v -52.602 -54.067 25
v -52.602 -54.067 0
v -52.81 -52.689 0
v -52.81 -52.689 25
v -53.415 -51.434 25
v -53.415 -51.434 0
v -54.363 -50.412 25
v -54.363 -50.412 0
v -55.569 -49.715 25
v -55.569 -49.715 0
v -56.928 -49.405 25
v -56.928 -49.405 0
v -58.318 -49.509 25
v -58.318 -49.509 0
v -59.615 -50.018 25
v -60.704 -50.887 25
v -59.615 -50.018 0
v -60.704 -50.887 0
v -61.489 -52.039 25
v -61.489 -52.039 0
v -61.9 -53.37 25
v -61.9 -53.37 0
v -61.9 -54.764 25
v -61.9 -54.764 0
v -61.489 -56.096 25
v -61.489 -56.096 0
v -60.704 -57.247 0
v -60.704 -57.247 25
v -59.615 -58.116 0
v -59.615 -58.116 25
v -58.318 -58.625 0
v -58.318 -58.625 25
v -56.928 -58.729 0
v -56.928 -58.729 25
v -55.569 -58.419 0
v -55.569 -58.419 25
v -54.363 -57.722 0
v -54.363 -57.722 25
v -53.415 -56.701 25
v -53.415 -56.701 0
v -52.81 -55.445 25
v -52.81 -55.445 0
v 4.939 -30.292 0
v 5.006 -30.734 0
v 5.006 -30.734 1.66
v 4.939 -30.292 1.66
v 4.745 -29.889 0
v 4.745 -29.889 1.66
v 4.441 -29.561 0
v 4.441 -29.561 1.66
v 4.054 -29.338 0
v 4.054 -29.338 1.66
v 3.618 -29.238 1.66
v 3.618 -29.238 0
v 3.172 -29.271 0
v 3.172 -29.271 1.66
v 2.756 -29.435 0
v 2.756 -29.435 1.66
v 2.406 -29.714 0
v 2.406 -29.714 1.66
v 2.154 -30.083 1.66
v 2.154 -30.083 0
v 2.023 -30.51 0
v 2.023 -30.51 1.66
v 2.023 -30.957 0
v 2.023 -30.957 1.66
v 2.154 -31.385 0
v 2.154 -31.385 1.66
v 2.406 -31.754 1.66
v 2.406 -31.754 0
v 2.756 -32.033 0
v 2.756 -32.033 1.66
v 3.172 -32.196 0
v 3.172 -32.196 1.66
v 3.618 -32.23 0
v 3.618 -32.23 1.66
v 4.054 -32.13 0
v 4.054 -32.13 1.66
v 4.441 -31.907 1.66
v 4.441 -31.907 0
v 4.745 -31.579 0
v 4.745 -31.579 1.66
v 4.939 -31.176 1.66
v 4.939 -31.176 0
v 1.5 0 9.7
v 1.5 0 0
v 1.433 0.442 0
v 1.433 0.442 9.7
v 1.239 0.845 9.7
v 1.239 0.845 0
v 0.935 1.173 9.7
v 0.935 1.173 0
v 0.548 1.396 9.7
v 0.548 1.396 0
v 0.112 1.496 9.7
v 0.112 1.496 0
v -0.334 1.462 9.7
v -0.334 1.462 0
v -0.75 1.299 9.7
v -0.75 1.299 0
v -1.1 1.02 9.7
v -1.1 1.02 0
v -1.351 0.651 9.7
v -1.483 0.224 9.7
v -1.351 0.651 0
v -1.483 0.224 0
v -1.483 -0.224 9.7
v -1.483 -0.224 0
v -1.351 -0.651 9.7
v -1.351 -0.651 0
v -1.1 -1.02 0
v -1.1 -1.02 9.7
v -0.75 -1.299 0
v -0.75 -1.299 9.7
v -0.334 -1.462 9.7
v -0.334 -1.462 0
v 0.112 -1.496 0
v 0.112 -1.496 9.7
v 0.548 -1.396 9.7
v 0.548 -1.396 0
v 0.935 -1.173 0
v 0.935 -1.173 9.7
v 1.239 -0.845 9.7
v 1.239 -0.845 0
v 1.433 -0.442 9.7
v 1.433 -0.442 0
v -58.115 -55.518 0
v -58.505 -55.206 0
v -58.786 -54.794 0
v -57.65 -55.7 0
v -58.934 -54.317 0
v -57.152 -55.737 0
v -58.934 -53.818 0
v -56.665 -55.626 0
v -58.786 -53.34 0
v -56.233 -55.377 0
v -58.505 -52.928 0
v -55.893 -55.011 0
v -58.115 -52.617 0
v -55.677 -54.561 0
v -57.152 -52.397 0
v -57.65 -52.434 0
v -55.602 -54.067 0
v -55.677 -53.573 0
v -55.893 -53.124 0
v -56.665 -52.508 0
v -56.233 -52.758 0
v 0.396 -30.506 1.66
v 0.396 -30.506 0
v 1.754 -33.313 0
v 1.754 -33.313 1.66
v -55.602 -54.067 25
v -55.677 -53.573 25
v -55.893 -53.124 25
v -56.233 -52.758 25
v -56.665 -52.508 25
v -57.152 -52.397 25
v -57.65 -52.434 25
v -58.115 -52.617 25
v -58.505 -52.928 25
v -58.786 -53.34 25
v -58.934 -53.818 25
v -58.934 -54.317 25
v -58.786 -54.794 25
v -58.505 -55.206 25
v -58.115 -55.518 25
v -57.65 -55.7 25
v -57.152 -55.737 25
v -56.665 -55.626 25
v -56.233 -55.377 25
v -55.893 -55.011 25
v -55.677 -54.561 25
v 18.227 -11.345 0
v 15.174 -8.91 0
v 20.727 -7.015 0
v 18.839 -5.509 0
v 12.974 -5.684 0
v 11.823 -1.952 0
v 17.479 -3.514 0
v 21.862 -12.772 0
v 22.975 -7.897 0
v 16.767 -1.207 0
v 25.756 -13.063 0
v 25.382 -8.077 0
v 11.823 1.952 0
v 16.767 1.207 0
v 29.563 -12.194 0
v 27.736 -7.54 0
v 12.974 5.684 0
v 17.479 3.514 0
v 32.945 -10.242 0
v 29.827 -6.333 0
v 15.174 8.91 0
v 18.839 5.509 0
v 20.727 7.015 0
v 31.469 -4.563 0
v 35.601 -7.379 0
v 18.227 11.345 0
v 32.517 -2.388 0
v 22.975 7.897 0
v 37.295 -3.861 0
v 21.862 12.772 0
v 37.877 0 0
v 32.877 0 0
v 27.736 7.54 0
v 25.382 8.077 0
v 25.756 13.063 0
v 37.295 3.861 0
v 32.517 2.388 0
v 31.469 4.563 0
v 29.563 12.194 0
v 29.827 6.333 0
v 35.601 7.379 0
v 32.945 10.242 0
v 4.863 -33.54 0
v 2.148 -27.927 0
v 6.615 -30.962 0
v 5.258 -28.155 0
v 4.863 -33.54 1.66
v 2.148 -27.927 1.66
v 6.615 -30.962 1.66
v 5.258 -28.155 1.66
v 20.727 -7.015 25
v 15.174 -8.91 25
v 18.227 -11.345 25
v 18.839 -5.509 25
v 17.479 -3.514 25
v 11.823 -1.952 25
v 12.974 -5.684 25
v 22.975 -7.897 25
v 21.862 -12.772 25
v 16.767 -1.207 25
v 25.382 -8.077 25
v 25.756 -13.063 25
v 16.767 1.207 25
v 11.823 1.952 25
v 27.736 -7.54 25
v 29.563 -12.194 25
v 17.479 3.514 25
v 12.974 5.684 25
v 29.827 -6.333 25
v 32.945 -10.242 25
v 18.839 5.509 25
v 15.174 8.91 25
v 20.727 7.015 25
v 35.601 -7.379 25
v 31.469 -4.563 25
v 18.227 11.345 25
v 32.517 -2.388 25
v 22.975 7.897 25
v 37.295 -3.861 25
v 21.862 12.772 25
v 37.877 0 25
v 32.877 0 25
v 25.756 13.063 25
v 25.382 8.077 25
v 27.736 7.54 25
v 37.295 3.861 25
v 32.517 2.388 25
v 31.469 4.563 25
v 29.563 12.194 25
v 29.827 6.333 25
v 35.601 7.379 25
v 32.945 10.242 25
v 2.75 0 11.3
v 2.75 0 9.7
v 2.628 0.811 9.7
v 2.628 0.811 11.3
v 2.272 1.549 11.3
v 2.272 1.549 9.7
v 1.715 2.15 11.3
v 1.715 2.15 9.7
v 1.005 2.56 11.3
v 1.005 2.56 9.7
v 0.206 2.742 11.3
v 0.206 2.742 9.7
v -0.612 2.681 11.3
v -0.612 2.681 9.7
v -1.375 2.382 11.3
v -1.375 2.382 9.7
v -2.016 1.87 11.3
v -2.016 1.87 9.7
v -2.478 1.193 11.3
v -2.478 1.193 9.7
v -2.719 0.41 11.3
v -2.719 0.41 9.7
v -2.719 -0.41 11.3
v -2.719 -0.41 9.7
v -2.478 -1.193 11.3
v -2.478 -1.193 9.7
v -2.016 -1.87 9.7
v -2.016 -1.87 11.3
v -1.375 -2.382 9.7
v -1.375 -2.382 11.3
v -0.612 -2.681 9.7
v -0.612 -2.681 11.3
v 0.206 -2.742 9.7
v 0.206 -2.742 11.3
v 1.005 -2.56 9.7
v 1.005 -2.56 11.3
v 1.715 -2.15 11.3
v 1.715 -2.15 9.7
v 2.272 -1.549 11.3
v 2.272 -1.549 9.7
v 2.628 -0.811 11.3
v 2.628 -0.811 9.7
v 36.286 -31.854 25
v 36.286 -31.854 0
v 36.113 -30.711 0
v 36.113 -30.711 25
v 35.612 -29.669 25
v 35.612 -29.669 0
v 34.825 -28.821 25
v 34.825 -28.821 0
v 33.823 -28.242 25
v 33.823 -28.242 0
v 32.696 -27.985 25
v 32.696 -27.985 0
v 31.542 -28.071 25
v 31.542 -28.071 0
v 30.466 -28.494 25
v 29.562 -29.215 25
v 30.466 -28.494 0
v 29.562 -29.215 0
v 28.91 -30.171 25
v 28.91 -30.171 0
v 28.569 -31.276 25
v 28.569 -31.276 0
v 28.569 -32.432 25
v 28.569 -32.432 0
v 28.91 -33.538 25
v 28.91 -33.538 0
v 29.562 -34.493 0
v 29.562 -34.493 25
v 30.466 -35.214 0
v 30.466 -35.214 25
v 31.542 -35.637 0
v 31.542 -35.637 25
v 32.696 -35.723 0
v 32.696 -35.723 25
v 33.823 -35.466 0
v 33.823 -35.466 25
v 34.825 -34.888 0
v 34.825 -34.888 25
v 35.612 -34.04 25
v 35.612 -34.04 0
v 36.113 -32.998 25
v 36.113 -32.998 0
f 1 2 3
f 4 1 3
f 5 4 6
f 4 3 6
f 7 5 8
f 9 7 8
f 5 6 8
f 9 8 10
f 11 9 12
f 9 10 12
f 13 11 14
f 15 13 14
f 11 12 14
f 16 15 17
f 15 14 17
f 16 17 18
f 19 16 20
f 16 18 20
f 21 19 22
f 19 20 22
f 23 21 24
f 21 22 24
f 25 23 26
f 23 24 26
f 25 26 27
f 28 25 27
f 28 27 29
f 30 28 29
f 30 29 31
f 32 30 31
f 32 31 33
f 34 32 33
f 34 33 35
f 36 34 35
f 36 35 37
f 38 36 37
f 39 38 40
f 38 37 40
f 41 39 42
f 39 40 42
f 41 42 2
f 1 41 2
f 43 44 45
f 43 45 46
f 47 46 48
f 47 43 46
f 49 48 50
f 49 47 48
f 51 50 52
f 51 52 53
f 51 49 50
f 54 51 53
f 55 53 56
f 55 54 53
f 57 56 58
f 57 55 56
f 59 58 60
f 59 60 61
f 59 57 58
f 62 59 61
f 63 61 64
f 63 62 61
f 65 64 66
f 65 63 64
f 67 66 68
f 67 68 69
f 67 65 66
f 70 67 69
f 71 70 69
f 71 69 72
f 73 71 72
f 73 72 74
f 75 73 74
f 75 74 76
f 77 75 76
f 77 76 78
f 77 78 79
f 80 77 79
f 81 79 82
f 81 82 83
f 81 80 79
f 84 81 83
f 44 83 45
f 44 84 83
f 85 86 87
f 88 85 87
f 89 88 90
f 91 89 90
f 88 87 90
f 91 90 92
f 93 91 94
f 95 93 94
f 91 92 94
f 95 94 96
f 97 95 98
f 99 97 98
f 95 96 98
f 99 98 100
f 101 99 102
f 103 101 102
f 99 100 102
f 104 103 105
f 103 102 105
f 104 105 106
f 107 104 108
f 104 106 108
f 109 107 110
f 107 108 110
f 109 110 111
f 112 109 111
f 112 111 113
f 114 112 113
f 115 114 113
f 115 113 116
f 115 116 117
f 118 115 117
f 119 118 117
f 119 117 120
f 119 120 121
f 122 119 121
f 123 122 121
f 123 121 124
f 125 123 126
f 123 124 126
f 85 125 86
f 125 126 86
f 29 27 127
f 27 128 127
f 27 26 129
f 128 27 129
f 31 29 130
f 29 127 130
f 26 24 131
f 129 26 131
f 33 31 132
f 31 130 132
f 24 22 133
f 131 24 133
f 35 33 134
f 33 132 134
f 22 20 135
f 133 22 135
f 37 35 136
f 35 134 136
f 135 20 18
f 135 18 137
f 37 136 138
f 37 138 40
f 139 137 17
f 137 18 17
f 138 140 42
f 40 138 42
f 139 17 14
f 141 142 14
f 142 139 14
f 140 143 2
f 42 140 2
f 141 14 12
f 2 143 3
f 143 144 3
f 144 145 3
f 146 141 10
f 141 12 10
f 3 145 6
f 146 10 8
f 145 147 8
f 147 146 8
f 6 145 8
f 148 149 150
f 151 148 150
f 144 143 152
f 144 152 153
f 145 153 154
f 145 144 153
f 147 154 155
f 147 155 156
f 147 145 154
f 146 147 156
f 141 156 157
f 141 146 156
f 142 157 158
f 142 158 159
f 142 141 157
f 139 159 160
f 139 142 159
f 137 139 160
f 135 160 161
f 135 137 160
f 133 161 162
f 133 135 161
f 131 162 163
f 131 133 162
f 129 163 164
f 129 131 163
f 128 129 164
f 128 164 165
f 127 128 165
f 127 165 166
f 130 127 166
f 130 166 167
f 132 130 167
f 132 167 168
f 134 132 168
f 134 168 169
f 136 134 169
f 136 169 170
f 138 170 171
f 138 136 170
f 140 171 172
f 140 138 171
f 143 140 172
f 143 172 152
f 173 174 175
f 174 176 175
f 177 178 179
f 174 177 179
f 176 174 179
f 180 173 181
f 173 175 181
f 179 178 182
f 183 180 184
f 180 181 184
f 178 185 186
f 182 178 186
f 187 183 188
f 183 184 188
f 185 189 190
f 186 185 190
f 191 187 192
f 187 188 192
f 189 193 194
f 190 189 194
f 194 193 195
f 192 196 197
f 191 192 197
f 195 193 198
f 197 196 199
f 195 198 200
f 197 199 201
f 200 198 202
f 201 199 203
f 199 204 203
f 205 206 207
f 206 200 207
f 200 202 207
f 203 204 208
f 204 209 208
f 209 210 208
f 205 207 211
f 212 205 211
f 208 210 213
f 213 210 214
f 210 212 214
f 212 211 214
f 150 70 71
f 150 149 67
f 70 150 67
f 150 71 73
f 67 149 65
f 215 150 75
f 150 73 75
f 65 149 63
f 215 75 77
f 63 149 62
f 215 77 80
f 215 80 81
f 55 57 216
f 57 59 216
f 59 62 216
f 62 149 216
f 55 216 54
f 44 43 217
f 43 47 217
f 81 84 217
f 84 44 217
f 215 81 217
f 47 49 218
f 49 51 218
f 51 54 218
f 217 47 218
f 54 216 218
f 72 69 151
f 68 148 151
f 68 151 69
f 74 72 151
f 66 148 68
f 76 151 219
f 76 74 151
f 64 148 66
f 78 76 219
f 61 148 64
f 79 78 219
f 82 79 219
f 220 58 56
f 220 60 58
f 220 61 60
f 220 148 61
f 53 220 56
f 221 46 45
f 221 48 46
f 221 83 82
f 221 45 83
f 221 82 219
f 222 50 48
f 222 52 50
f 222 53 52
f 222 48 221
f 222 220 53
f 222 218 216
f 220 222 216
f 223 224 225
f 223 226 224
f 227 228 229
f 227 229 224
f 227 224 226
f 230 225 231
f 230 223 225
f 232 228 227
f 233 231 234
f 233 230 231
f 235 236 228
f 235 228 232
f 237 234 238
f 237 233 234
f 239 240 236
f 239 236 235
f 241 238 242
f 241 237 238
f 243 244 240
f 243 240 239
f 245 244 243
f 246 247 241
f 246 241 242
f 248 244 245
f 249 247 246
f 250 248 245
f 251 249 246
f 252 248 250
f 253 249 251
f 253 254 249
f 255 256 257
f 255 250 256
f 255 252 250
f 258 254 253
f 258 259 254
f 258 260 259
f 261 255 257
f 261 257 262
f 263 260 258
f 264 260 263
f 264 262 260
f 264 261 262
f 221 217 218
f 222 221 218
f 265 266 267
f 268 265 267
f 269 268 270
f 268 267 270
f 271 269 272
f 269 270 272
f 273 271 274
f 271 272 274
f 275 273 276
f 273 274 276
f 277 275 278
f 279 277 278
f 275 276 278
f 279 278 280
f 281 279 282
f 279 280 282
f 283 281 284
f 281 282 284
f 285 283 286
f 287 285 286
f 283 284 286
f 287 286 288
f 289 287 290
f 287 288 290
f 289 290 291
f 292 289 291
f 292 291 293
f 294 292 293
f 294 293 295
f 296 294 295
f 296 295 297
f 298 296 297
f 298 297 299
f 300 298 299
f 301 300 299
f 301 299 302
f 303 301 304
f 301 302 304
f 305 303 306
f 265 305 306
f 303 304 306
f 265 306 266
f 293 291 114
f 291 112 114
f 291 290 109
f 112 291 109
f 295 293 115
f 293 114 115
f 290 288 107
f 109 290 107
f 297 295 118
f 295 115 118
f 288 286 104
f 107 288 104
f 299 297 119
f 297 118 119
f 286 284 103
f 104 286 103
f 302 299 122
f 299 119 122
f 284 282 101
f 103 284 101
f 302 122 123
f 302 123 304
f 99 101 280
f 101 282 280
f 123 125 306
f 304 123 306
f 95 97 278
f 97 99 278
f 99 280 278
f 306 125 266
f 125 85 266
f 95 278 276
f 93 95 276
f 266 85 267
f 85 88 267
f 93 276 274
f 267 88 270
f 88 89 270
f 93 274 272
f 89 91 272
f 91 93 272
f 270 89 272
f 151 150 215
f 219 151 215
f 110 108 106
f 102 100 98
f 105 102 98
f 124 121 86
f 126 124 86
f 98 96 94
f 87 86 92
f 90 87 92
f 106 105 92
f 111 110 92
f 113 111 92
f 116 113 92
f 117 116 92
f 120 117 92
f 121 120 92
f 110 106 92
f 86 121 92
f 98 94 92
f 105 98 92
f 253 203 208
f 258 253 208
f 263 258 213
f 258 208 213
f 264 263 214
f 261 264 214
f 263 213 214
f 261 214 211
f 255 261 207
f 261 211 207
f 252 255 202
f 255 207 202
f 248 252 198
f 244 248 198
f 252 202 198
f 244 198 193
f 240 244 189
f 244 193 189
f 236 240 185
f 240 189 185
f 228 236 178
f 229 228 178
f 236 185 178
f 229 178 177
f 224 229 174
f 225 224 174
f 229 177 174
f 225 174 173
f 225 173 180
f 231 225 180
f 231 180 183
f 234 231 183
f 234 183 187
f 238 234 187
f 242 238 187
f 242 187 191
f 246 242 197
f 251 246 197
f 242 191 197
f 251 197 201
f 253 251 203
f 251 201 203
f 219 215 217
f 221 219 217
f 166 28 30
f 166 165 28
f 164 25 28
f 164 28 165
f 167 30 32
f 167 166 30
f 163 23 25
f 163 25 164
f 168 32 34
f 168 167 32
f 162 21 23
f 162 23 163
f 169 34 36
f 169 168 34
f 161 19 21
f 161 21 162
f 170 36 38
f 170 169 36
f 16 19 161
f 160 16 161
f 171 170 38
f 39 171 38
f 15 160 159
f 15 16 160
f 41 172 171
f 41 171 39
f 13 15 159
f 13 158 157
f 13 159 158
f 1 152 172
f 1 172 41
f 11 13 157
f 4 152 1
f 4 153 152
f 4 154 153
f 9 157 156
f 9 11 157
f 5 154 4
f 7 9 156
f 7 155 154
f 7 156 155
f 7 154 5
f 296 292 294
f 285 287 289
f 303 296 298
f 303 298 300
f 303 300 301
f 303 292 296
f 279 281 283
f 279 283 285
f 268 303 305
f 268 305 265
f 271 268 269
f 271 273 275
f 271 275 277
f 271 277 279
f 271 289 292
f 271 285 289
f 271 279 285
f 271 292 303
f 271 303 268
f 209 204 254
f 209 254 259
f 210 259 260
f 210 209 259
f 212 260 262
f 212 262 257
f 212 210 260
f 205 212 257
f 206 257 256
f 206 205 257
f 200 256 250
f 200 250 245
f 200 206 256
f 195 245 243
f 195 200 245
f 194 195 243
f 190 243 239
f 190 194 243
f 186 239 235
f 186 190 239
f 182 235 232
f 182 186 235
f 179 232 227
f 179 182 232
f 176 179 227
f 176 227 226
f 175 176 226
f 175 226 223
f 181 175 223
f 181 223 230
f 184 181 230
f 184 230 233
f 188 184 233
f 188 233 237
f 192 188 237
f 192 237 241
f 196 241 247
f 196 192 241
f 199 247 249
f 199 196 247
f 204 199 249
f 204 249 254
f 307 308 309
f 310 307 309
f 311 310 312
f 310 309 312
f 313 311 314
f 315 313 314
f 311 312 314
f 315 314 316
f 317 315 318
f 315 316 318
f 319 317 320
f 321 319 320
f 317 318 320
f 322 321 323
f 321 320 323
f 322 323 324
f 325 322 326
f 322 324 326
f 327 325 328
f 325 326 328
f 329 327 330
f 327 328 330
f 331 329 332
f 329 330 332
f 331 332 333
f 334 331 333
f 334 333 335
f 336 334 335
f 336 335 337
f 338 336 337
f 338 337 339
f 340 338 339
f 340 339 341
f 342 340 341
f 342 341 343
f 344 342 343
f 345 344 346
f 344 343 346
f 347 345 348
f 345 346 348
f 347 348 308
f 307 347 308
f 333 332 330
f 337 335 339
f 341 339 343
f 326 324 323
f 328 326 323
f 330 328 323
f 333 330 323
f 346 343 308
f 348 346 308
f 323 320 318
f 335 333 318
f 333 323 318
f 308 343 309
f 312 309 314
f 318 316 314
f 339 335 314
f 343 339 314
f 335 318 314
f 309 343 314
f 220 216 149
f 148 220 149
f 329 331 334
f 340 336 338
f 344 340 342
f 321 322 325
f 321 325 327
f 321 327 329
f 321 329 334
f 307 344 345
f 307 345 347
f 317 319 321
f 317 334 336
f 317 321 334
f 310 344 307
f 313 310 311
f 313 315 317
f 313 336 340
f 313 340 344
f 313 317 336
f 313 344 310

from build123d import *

# Parameters (mm, degrees)
F0_R      = 1.5
F1_DEPTH  = 9.7
F2_R      = 2.75
F3_DEPTH  = 1.6
F4_R      = 1.5
F5_DEPTH  = 1.66
F6_R      = 13.1
F6_R_2    = 8.1
F7_DEPTH  = 25
F8_R      = 3.88
F9_DEPTH  = 25
F10_R     = 4.675
F10_R_2   = 1.675
F11_DEPTH = 25


with BuildPart() as f1:
    # F0 (on Top) → F1 (new body)
    with BuildSketch(Plane.XY):
        Circle(F0_R)
    extrude(amount=F1_DEPTH)

    # F2 (on face) → F3 (join)
    with BuildSketch(Plane.XY.offset(9.7)):
        Circle(F2_R)
    extrude(amount=F3_DEPTH)


with BuildPart() as f5:
    # F4 (on Top) → F5 (new body)
    with BuildSketch(Plane.XY):
        Polygon((4.863402, -33.540481), (6.615238, -30.961514), (5.257705, -28.154896), (2.148336, -27.927245), (0.3965, -30.506212), (1.754033, -33.31283), align=None)
        with Locations((3.505869, -30.733863)):
            Circle(F4_R, mode=Mode.SUBTRACT)
    extrude(amount=F5_DEPTH)


with BuildPart() as f7:
    # F6 (on Top) → F7 (new body)
    with BuildSketch(Plane.XY):
        with Locations((24.776956, 0)):
            Circle(F6_R)
        with Locations((24.776956, 0)):
            Circle(F6_R_2, mode=Mode.SUBTRACT)
    extrude(amount=F7_DEPTH)


with BuildPart() as f9:
    # F8 (on Top) → F9 (new body)
    with BuildSketch(Plane.XY):
        with Locations((32.405801, -31.85419)):
            Circle(F8_R)
    extrude(amount=F9_DEPTH)


with BuildPart() as f11:
    # F10 (on Top) → F11 (new body)
    with BuildSketch(Plane.XY):
        with Locations((-57.277318, -54.06715)):
            Circle(F10_R)
        with Locations((-57.277318, -54.06715)):
            Circle(F10_R_2, mode=Mode.SUBTRACT)
    extrude(amount=F11_DEPTH)


solid = Compound([f1.part, f5.part, f7.part, f9.part, f11.part])
